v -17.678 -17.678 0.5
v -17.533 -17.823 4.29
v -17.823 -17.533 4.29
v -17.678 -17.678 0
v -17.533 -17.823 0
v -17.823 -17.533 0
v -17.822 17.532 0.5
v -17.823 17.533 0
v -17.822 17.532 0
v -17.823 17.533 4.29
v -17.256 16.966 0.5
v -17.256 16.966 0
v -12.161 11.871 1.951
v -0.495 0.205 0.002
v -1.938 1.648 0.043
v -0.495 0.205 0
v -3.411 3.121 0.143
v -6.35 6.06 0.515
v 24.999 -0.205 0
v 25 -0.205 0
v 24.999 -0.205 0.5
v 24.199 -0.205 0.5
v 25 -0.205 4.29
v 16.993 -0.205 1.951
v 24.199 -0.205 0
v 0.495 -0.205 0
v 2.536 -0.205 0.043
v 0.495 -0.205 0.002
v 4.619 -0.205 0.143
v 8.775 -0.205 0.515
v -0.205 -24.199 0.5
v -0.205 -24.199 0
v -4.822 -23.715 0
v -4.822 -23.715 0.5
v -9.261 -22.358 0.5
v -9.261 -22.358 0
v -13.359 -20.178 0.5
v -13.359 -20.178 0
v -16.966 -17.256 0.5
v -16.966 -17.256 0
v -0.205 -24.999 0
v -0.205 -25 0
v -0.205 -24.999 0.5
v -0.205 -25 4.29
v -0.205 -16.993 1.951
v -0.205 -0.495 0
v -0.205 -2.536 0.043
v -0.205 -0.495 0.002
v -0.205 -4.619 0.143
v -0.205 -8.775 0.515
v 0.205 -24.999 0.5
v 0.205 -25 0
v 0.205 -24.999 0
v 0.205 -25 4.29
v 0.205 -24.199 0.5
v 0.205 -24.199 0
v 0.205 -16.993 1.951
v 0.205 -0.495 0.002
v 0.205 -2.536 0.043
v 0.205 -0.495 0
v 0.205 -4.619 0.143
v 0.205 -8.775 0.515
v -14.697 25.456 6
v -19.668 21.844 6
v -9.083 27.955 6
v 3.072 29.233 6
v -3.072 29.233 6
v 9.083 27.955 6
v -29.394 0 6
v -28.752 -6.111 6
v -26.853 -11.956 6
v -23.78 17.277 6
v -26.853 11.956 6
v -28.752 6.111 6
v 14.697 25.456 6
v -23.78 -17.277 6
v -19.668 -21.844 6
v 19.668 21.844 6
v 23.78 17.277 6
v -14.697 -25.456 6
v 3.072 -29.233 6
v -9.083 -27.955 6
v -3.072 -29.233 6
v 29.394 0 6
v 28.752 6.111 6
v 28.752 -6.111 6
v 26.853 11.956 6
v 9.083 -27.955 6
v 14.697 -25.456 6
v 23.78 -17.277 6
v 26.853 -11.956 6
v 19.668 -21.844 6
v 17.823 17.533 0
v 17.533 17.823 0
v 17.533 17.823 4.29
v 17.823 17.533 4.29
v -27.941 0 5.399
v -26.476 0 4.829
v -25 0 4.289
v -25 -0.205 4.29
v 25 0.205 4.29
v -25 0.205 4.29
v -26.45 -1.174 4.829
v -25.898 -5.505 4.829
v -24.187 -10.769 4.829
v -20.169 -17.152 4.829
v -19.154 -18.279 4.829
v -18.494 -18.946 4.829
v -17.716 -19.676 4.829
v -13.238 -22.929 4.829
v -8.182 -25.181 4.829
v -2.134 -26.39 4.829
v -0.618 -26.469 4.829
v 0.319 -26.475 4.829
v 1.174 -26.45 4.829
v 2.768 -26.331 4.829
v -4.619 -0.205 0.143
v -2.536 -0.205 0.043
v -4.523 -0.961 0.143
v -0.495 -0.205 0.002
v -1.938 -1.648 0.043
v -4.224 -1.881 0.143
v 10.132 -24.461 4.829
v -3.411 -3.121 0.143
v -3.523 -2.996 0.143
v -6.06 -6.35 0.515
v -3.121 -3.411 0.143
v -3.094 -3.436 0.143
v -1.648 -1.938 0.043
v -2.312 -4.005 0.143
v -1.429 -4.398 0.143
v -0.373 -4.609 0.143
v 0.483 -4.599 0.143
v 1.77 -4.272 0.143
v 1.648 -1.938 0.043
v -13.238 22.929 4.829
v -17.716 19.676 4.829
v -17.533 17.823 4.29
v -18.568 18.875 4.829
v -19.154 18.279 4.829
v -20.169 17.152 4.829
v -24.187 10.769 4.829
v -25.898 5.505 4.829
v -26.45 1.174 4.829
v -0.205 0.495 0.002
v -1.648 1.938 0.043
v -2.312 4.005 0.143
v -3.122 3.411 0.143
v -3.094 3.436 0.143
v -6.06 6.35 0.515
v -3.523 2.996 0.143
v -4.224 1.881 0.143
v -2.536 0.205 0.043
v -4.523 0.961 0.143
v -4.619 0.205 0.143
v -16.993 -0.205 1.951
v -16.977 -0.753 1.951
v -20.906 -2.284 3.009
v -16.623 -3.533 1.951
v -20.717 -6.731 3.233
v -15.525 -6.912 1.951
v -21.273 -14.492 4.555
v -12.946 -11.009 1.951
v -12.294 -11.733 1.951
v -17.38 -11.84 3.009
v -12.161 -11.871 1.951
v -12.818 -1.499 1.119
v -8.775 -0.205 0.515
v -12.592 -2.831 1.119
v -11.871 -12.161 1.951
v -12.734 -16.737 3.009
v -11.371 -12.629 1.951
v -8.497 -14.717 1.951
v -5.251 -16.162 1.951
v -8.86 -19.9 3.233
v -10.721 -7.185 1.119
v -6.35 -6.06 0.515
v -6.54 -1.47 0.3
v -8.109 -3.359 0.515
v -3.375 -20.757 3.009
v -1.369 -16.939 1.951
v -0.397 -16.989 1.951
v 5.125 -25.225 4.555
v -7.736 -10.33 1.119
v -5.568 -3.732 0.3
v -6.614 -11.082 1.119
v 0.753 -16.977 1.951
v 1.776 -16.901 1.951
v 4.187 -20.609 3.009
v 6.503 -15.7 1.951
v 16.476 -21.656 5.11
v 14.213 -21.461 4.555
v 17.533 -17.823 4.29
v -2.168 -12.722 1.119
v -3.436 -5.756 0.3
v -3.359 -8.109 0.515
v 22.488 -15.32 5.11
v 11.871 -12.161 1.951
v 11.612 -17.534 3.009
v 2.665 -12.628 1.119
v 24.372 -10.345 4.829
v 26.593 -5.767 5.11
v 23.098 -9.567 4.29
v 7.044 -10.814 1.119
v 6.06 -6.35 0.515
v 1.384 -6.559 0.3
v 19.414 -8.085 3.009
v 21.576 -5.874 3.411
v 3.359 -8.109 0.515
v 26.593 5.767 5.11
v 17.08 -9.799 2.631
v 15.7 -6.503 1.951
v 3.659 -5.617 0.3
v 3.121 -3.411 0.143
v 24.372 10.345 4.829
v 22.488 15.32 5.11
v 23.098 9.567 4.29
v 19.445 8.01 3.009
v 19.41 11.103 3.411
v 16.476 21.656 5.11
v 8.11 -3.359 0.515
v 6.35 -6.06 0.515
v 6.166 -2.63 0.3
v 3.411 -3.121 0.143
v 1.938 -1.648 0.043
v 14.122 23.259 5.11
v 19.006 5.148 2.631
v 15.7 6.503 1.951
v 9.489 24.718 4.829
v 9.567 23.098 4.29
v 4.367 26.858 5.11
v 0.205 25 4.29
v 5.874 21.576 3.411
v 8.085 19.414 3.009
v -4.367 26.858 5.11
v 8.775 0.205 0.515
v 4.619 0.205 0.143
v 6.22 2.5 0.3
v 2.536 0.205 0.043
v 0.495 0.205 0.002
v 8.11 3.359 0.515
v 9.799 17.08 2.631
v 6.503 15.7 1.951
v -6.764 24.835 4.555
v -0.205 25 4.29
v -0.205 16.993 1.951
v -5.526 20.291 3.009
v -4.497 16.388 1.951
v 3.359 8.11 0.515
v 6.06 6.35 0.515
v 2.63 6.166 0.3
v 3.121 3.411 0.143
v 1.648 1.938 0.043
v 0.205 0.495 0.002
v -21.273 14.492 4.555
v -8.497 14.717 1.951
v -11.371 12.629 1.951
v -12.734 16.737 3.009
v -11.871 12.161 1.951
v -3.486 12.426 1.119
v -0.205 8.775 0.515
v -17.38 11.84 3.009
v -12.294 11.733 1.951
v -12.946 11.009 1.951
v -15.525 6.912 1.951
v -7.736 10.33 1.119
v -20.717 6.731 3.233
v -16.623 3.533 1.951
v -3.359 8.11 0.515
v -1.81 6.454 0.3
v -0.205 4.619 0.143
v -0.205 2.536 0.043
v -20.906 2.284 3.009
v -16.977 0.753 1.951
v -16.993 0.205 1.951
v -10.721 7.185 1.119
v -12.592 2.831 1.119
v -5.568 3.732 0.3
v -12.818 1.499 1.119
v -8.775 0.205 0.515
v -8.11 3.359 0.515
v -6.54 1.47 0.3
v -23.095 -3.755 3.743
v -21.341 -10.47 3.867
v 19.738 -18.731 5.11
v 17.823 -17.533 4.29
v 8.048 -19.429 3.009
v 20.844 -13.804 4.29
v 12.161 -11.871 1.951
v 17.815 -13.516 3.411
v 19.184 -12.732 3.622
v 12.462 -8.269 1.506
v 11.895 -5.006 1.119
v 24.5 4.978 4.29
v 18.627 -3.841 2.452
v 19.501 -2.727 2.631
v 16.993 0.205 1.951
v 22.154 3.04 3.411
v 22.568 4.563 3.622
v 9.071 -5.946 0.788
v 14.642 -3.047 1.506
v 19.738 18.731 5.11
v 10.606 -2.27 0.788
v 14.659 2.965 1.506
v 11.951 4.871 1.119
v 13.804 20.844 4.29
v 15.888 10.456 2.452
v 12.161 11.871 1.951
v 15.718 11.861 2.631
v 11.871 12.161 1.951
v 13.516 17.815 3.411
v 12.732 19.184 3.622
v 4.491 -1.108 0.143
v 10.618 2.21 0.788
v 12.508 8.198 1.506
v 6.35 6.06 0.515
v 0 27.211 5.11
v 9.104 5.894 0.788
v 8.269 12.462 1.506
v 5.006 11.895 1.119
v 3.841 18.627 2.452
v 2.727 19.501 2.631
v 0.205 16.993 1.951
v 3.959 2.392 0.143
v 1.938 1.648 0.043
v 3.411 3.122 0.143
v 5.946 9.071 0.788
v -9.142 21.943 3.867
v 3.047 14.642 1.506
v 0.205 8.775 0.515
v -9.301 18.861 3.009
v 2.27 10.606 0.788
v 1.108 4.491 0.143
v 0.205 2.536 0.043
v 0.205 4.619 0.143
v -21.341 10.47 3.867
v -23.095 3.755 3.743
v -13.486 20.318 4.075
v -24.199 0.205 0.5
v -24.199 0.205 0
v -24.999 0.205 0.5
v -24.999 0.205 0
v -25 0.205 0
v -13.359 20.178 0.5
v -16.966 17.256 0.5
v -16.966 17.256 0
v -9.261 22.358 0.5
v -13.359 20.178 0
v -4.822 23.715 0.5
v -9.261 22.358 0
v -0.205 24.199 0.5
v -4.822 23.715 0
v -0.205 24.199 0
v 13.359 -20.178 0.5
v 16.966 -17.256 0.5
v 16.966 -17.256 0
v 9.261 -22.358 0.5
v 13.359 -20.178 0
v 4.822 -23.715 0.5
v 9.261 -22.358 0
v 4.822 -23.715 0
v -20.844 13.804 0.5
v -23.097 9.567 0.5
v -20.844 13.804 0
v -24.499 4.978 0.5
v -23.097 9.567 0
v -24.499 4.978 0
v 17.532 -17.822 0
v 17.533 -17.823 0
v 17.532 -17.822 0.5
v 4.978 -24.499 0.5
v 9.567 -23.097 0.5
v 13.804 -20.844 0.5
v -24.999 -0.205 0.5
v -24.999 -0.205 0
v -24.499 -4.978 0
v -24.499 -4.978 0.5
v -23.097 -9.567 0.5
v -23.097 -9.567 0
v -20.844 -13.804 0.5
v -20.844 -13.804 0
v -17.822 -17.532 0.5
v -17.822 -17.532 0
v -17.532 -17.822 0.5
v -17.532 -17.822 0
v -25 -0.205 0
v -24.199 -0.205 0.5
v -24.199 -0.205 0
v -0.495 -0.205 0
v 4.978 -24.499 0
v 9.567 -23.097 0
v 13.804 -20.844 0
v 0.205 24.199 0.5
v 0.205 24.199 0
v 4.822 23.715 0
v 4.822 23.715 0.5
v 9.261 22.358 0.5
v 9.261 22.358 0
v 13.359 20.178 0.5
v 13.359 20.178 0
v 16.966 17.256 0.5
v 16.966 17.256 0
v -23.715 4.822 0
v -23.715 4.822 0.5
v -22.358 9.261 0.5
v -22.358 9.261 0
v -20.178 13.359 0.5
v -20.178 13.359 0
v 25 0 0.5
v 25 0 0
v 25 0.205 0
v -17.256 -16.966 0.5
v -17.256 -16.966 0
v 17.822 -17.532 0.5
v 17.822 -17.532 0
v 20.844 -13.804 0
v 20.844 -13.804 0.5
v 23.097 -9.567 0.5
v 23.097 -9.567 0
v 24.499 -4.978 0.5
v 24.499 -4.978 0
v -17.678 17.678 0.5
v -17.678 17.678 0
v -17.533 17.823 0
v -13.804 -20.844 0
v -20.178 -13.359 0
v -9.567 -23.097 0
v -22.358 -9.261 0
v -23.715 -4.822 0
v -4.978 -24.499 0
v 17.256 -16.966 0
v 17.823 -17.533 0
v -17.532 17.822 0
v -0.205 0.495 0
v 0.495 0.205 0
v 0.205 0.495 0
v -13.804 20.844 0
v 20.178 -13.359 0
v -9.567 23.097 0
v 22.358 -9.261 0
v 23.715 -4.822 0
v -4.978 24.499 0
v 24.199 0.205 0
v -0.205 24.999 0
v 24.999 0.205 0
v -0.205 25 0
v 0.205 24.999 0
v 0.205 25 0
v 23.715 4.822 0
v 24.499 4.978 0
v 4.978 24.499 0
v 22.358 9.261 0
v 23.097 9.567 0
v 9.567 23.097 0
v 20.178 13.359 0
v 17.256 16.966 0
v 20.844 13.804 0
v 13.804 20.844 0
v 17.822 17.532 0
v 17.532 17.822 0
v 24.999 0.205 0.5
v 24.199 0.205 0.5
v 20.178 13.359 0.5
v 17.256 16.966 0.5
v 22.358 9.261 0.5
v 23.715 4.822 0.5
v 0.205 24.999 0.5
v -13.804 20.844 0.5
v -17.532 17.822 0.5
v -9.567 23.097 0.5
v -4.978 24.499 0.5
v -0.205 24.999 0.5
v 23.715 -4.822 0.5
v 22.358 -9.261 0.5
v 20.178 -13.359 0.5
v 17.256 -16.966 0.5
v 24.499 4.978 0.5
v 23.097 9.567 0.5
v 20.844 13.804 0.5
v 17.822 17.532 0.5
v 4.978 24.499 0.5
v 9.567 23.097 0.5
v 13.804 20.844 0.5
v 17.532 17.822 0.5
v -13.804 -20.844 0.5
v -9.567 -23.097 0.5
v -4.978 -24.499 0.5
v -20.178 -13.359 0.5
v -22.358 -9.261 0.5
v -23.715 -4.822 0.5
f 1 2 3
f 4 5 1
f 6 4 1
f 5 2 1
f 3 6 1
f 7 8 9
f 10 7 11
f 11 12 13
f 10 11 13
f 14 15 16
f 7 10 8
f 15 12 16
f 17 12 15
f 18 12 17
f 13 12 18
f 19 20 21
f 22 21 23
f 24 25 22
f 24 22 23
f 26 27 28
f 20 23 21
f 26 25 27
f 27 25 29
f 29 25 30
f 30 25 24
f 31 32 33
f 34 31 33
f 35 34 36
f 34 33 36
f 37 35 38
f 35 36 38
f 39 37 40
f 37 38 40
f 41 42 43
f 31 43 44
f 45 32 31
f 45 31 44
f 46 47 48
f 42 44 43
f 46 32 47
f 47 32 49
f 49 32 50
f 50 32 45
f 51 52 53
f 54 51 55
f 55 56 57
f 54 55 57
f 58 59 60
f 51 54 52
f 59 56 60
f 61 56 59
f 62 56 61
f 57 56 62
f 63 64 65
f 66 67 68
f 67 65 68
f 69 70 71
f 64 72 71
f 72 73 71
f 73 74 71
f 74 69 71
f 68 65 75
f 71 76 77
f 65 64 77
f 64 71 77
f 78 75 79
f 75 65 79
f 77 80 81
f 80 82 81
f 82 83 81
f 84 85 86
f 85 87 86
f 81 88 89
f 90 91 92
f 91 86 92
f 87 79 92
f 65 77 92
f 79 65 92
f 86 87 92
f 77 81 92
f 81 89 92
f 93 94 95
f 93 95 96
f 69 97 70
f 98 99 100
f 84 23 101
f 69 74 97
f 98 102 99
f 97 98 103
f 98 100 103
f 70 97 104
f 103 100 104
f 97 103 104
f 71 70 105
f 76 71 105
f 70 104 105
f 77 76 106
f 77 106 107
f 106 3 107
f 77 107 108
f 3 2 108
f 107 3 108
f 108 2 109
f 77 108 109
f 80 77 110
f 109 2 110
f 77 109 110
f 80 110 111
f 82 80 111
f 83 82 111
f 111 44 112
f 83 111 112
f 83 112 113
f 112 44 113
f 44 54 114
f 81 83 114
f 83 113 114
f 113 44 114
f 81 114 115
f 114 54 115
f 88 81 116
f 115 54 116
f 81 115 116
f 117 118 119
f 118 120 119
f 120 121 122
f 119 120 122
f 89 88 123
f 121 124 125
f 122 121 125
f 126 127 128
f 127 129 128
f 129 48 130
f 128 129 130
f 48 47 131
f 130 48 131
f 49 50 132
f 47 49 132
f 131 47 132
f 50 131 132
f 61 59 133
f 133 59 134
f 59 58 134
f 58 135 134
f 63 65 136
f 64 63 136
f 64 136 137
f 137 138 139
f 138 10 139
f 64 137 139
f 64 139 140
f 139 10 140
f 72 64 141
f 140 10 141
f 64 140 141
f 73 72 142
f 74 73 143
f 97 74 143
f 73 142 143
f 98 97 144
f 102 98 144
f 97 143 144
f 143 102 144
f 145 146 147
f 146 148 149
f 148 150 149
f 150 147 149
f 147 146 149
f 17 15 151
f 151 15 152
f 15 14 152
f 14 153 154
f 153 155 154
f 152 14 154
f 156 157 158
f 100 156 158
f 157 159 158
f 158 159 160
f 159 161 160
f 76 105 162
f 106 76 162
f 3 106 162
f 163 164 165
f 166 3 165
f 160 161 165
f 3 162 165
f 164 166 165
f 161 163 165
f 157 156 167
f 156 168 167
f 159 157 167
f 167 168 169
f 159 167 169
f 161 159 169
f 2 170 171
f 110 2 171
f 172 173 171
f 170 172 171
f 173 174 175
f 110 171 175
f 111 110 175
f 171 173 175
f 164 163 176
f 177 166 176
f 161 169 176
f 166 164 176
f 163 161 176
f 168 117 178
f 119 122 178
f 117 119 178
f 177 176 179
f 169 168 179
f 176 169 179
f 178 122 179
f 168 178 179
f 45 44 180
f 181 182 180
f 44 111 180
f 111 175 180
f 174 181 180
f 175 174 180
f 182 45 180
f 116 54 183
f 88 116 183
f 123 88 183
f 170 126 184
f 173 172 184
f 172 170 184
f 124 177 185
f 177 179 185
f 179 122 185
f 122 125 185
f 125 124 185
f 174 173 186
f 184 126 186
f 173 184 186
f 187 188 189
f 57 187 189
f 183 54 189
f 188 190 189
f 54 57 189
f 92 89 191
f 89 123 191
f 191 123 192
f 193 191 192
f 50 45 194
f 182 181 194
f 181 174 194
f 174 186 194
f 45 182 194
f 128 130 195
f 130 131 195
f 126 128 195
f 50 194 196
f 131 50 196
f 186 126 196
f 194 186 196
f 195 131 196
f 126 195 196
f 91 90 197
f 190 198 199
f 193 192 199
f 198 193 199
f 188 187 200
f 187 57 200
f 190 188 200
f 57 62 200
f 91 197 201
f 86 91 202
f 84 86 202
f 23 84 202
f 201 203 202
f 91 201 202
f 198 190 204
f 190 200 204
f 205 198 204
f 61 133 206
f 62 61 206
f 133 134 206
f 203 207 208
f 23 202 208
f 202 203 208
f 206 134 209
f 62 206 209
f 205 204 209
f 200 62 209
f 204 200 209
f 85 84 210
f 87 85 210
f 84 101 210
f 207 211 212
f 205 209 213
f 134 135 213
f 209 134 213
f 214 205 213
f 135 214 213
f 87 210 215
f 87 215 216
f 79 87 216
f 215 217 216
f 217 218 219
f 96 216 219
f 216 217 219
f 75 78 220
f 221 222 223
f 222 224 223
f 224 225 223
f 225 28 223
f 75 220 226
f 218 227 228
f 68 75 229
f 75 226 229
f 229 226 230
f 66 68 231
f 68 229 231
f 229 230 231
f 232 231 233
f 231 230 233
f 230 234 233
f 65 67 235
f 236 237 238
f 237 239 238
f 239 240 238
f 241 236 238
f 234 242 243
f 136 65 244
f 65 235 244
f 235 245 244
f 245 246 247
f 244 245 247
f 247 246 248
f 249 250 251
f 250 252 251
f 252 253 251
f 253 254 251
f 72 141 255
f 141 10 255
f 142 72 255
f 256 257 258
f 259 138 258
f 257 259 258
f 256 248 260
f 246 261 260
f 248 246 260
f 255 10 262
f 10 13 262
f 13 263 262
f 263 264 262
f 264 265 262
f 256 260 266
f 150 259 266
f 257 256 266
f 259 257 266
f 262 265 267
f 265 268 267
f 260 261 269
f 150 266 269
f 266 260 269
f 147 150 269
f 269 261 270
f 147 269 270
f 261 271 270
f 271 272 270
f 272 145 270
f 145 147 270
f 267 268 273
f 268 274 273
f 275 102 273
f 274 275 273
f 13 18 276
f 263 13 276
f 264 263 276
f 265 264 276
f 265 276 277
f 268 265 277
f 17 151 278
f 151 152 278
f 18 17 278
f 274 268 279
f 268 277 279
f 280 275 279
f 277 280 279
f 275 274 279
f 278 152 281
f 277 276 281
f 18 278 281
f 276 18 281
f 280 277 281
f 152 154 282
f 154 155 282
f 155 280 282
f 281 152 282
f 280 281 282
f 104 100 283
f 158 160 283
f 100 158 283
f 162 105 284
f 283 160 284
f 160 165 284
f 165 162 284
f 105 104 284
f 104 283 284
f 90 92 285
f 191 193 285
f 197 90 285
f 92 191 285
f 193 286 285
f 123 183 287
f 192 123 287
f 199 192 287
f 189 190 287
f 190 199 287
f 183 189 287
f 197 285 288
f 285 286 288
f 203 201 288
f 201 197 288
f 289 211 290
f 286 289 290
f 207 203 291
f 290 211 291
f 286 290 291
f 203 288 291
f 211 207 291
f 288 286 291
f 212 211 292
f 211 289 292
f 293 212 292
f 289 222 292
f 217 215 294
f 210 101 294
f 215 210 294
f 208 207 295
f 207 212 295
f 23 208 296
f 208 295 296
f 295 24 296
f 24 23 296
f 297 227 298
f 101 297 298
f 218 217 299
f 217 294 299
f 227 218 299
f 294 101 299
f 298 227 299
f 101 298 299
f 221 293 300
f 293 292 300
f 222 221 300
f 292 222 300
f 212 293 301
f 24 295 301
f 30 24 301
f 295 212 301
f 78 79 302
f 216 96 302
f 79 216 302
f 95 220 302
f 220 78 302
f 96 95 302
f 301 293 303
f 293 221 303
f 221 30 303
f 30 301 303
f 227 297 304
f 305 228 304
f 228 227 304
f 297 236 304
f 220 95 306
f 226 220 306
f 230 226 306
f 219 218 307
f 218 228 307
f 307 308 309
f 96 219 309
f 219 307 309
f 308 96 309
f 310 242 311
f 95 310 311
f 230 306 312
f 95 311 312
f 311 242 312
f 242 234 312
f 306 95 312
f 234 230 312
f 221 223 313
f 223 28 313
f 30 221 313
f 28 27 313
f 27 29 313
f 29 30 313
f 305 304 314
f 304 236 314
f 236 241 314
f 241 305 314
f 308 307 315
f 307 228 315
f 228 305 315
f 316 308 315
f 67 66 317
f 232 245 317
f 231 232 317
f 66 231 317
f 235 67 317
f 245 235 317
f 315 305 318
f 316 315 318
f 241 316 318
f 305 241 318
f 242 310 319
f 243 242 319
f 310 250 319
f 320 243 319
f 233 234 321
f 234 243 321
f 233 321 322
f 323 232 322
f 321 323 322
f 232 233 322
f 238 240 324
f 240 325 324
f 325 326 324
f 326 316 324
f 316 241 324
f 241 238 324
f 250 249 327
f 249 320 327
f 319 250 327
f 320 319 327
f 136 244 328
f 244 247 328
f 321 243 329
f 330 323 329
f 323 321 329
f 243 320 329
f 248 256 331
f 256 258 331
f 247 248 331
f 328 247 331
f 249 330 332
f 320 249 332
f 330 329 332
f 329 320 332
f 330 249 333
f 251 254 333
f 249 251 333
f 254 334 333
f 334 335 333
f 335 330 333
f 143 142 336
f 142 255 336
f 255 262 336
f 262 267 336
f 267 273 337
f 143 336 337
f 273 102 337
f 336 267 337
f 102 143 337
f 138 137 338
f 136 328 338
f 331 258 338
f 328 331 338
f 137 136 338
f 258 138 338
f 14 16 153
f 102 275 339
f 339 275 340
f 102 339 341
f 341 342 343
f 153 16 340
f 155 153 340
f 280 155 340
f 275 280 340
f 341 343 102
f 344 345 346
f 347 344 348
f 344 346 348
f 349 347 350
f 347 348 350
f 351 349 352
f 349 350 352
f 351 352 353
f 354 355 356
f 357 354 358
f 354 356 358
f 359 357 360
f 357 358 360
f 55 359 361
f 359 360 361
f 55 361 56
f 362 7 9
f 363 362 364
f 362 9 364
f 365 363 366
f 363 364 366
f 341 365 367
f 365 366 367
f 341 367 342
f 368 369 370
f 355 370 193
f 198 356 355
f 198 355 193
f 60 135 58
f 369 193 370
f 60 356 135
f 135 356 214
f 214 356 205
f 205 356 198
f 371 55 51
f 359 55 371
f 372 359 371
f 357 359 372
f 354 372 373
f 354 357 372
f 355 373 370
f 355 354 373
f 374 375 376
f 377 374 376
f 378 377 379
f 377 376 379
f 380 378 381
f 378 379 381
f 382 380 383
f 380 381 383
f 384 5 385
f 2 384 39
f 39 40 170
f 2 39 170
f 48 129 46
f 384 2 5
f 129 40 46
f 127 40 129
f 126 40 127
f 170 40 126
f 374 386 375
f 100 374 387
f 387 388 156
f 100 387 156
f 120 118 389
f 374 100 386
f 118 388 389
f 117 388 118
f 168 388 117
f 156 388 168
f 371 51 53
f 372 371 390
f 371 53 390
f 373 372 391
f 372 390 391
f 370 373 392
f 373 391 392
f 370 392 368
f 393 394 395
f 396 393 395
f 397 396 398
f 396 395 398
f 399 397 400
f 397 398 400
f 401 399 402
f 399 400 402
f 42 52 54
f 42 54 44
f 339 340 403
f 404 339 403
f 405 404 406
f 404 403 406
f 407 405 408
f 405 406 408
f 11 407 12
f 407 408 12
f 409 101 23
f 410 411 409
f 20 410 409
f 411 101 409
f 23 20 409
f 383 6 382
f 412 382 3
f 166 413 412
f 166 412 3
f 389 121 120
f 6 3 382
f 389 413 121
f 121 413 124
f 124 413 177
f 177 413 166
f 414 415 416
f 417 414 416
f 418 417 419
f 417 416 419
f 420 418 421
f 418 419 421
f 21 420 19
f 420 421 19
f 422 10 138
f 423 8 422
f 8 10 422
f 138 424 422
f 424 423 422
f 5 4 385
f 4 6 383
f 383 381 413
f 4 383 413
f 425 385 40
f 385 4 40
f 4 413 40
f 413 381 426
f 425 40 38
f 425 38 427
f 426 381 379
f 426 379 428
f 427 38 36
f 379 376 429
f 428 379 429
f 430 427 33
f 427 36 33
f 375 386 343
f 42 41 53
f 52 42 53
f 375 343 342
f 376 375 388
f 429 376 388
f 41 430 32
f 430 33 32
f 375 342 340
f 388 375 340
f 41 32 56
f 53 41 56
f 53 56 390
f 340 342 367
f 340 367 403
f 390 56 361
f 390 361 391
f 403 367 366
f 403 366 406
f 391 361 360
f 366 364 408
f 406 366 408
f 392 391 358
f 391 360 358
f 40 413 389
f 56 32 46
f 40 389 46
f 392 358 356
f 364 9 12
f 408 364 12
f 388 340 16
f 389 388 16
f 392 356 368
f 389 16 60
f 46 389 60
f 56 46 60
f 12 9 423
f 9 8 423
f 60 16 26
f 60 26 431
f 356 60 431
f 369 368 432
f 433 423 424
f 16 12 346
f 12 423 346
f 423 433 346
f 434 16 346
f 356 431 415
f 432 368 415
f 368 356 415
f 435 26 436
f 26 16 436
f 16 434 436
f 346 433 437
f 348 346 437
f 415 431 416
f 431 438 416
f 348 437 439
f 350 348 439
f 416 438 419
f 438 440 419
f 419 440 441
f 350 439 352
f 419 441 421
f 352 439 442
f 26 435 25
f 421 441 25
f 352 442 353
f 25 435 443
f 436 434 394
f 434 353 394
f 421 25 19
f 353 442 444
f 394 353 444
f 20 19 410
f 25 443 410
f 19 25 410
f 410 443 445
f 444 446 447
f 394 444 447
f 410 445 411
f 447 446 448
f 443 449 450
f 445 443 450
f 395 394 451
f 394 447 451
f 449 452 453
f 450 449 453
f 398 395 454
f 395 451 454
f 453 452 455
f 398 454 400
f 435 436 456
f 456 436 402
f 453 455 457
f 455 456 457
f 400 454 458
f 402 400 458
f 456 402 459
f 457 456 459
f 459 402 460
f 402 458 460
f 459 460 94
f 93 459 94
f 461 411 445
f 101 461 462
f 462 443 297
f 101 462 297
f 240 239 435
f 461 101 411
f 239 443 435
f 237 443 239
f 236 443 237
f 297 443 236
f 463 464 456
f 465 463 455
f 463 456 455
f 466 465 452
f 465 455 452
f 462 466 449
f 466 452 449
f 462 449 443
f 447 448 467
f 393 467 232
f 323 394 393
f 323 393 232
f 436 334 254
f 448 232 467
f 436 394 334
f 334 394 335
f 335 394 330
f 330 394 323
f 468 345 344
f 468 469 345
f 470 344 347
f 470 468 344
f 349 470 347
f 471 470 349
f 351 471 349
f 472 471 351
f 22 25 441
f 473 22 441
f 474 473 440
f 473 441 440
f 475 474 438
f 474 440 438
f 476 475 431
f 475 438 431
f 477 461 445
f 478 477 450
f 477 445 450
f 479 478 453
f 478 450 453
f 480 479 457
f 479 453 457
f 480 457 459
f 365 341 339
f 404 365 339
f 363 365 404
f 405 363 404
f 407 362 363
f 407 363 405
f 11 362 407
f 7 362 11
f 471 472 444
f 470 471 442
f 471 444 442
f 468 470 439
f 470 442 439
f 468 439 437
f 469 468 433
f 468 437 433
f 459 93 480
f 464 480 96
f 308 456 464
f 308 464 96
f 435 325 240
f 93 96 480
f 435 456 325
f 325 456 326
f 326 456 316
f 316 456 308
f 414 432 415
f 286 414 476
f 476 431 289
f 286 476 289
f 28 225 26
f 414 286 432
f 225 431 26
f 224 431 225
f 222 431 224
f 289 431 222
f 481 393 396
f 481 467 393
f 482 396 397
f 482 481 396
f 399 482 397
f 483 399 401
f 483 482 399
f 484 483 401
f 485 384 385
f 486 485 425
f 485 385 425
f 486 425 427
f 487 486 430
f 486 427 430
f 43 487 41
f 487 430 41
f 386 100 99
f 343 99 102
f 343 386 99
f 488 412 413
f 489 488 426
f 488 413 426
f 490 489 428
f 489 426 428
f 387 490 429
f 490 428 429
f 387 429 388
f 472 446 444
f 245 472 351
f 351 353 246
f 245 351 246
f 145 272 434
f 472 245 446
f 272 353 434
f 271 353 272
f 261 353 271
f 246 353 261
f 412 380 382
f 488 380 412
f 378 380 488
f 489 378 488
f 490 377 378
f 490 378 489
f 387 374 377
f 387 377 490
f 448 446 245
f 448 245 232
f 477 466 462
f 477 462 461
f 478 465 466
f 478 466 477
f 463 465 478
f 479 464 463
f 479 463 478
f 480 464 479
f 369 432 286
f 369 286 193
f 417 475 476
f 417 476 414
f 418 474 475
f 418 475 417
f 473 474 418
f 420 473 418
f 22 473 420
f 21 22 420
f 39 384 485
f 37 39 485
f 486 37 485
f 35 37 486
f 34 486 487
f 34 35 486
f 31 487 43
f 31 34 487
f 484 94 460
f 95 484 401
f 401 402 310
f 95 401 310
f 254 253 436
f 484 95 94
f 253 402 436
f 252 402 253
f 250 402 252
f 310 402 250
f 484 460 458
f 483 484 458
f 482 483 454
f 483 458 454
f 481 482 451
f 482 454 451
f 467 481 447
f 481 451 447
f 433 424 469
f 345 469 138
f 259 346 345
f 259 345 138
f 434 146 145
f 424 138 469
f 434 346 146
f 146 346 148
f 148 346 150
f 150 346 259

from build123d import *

# Parameters (mm, degrees)
F0_W     = 25
F0_H     = 0.41
F1_DEPTH = 5
F3_COUNT = 8
F7_DEPTH = 0.5


with BuildPart() as f1:
    # F0 (on Top) → F1 (new body)
    with BuildSketch(Plane.XY):
        with Locations((-12.5, 0)):
            Rectangle(F0_W, F0_H)
    extrude(amount=F1_DEPTH)

    # F3: F1 ×8 about axis
    f3_axis = Axis((0, 0, 6.672881), (0, 0, 1))


with BuildPart() as f1_1:
    add(f1.part)
    for i in range(1, F3_COUNT):
        add(f1.part.rotate(f3_axis, i * 360 / F3_COUNT))

    # F4 (on Front) → F5 (revolve)
    with BuildSketch(Plane.XZ):
        with BuildLine():
            Line((0, 6), (-29.393877, 6))
            ThreePointArc((-29.393877, 6), (-15, 1.515308), (0, 0))
            Line((0, 0), (0, 6))
        make_face()
    revolve(axis=Axis((0, 0, 6.672881), (0, 0, 1)))

    # F6 (on Top) → F7 (join)
    with BuildSketch(Plane.XY):
        with BuildLine():
            ThreePointArc((-24.999159, -0.205), (0.102501, -24.99979), (25, 0))
            ThreePointArc((25, 0), (0.102501, 24.99979), (-24.999159, 0.205))
            Line((-24.999159, 0.205), (-24.199132, 0.205))
            ThreePointArc((-24.199132, 0.205), (0.102501, 24.199783), (24.2, 0))
            ThreePointArc((24.2, 0), (0.102501, -24.199783), (-24.199132, -0.205))
            Line((-24.199132, -0.205), (-24.999159, -0.205))
        make_face()
        with BuildLine():
            ThreePointArc((-25, 0), (-24.99979, 0.102501), (-24.999159, 0.205))
            Line((-24.999159, 0.205), (-25, 0.205))
            Line((-25, 0.205), (-25, 0))
        make_face()
        with BuildLine():
            Line((-25, -0.205), (-24.999159, -0.205))
            ThreePointArc((-24.999159, -0.205), (-24.99979, -0.102501), (-25, 0))
            Line((-25, 0), (-25, -0.205))
        make_face()
    extrude(amount=F7_DEPTH)


solid = f1_1.part
